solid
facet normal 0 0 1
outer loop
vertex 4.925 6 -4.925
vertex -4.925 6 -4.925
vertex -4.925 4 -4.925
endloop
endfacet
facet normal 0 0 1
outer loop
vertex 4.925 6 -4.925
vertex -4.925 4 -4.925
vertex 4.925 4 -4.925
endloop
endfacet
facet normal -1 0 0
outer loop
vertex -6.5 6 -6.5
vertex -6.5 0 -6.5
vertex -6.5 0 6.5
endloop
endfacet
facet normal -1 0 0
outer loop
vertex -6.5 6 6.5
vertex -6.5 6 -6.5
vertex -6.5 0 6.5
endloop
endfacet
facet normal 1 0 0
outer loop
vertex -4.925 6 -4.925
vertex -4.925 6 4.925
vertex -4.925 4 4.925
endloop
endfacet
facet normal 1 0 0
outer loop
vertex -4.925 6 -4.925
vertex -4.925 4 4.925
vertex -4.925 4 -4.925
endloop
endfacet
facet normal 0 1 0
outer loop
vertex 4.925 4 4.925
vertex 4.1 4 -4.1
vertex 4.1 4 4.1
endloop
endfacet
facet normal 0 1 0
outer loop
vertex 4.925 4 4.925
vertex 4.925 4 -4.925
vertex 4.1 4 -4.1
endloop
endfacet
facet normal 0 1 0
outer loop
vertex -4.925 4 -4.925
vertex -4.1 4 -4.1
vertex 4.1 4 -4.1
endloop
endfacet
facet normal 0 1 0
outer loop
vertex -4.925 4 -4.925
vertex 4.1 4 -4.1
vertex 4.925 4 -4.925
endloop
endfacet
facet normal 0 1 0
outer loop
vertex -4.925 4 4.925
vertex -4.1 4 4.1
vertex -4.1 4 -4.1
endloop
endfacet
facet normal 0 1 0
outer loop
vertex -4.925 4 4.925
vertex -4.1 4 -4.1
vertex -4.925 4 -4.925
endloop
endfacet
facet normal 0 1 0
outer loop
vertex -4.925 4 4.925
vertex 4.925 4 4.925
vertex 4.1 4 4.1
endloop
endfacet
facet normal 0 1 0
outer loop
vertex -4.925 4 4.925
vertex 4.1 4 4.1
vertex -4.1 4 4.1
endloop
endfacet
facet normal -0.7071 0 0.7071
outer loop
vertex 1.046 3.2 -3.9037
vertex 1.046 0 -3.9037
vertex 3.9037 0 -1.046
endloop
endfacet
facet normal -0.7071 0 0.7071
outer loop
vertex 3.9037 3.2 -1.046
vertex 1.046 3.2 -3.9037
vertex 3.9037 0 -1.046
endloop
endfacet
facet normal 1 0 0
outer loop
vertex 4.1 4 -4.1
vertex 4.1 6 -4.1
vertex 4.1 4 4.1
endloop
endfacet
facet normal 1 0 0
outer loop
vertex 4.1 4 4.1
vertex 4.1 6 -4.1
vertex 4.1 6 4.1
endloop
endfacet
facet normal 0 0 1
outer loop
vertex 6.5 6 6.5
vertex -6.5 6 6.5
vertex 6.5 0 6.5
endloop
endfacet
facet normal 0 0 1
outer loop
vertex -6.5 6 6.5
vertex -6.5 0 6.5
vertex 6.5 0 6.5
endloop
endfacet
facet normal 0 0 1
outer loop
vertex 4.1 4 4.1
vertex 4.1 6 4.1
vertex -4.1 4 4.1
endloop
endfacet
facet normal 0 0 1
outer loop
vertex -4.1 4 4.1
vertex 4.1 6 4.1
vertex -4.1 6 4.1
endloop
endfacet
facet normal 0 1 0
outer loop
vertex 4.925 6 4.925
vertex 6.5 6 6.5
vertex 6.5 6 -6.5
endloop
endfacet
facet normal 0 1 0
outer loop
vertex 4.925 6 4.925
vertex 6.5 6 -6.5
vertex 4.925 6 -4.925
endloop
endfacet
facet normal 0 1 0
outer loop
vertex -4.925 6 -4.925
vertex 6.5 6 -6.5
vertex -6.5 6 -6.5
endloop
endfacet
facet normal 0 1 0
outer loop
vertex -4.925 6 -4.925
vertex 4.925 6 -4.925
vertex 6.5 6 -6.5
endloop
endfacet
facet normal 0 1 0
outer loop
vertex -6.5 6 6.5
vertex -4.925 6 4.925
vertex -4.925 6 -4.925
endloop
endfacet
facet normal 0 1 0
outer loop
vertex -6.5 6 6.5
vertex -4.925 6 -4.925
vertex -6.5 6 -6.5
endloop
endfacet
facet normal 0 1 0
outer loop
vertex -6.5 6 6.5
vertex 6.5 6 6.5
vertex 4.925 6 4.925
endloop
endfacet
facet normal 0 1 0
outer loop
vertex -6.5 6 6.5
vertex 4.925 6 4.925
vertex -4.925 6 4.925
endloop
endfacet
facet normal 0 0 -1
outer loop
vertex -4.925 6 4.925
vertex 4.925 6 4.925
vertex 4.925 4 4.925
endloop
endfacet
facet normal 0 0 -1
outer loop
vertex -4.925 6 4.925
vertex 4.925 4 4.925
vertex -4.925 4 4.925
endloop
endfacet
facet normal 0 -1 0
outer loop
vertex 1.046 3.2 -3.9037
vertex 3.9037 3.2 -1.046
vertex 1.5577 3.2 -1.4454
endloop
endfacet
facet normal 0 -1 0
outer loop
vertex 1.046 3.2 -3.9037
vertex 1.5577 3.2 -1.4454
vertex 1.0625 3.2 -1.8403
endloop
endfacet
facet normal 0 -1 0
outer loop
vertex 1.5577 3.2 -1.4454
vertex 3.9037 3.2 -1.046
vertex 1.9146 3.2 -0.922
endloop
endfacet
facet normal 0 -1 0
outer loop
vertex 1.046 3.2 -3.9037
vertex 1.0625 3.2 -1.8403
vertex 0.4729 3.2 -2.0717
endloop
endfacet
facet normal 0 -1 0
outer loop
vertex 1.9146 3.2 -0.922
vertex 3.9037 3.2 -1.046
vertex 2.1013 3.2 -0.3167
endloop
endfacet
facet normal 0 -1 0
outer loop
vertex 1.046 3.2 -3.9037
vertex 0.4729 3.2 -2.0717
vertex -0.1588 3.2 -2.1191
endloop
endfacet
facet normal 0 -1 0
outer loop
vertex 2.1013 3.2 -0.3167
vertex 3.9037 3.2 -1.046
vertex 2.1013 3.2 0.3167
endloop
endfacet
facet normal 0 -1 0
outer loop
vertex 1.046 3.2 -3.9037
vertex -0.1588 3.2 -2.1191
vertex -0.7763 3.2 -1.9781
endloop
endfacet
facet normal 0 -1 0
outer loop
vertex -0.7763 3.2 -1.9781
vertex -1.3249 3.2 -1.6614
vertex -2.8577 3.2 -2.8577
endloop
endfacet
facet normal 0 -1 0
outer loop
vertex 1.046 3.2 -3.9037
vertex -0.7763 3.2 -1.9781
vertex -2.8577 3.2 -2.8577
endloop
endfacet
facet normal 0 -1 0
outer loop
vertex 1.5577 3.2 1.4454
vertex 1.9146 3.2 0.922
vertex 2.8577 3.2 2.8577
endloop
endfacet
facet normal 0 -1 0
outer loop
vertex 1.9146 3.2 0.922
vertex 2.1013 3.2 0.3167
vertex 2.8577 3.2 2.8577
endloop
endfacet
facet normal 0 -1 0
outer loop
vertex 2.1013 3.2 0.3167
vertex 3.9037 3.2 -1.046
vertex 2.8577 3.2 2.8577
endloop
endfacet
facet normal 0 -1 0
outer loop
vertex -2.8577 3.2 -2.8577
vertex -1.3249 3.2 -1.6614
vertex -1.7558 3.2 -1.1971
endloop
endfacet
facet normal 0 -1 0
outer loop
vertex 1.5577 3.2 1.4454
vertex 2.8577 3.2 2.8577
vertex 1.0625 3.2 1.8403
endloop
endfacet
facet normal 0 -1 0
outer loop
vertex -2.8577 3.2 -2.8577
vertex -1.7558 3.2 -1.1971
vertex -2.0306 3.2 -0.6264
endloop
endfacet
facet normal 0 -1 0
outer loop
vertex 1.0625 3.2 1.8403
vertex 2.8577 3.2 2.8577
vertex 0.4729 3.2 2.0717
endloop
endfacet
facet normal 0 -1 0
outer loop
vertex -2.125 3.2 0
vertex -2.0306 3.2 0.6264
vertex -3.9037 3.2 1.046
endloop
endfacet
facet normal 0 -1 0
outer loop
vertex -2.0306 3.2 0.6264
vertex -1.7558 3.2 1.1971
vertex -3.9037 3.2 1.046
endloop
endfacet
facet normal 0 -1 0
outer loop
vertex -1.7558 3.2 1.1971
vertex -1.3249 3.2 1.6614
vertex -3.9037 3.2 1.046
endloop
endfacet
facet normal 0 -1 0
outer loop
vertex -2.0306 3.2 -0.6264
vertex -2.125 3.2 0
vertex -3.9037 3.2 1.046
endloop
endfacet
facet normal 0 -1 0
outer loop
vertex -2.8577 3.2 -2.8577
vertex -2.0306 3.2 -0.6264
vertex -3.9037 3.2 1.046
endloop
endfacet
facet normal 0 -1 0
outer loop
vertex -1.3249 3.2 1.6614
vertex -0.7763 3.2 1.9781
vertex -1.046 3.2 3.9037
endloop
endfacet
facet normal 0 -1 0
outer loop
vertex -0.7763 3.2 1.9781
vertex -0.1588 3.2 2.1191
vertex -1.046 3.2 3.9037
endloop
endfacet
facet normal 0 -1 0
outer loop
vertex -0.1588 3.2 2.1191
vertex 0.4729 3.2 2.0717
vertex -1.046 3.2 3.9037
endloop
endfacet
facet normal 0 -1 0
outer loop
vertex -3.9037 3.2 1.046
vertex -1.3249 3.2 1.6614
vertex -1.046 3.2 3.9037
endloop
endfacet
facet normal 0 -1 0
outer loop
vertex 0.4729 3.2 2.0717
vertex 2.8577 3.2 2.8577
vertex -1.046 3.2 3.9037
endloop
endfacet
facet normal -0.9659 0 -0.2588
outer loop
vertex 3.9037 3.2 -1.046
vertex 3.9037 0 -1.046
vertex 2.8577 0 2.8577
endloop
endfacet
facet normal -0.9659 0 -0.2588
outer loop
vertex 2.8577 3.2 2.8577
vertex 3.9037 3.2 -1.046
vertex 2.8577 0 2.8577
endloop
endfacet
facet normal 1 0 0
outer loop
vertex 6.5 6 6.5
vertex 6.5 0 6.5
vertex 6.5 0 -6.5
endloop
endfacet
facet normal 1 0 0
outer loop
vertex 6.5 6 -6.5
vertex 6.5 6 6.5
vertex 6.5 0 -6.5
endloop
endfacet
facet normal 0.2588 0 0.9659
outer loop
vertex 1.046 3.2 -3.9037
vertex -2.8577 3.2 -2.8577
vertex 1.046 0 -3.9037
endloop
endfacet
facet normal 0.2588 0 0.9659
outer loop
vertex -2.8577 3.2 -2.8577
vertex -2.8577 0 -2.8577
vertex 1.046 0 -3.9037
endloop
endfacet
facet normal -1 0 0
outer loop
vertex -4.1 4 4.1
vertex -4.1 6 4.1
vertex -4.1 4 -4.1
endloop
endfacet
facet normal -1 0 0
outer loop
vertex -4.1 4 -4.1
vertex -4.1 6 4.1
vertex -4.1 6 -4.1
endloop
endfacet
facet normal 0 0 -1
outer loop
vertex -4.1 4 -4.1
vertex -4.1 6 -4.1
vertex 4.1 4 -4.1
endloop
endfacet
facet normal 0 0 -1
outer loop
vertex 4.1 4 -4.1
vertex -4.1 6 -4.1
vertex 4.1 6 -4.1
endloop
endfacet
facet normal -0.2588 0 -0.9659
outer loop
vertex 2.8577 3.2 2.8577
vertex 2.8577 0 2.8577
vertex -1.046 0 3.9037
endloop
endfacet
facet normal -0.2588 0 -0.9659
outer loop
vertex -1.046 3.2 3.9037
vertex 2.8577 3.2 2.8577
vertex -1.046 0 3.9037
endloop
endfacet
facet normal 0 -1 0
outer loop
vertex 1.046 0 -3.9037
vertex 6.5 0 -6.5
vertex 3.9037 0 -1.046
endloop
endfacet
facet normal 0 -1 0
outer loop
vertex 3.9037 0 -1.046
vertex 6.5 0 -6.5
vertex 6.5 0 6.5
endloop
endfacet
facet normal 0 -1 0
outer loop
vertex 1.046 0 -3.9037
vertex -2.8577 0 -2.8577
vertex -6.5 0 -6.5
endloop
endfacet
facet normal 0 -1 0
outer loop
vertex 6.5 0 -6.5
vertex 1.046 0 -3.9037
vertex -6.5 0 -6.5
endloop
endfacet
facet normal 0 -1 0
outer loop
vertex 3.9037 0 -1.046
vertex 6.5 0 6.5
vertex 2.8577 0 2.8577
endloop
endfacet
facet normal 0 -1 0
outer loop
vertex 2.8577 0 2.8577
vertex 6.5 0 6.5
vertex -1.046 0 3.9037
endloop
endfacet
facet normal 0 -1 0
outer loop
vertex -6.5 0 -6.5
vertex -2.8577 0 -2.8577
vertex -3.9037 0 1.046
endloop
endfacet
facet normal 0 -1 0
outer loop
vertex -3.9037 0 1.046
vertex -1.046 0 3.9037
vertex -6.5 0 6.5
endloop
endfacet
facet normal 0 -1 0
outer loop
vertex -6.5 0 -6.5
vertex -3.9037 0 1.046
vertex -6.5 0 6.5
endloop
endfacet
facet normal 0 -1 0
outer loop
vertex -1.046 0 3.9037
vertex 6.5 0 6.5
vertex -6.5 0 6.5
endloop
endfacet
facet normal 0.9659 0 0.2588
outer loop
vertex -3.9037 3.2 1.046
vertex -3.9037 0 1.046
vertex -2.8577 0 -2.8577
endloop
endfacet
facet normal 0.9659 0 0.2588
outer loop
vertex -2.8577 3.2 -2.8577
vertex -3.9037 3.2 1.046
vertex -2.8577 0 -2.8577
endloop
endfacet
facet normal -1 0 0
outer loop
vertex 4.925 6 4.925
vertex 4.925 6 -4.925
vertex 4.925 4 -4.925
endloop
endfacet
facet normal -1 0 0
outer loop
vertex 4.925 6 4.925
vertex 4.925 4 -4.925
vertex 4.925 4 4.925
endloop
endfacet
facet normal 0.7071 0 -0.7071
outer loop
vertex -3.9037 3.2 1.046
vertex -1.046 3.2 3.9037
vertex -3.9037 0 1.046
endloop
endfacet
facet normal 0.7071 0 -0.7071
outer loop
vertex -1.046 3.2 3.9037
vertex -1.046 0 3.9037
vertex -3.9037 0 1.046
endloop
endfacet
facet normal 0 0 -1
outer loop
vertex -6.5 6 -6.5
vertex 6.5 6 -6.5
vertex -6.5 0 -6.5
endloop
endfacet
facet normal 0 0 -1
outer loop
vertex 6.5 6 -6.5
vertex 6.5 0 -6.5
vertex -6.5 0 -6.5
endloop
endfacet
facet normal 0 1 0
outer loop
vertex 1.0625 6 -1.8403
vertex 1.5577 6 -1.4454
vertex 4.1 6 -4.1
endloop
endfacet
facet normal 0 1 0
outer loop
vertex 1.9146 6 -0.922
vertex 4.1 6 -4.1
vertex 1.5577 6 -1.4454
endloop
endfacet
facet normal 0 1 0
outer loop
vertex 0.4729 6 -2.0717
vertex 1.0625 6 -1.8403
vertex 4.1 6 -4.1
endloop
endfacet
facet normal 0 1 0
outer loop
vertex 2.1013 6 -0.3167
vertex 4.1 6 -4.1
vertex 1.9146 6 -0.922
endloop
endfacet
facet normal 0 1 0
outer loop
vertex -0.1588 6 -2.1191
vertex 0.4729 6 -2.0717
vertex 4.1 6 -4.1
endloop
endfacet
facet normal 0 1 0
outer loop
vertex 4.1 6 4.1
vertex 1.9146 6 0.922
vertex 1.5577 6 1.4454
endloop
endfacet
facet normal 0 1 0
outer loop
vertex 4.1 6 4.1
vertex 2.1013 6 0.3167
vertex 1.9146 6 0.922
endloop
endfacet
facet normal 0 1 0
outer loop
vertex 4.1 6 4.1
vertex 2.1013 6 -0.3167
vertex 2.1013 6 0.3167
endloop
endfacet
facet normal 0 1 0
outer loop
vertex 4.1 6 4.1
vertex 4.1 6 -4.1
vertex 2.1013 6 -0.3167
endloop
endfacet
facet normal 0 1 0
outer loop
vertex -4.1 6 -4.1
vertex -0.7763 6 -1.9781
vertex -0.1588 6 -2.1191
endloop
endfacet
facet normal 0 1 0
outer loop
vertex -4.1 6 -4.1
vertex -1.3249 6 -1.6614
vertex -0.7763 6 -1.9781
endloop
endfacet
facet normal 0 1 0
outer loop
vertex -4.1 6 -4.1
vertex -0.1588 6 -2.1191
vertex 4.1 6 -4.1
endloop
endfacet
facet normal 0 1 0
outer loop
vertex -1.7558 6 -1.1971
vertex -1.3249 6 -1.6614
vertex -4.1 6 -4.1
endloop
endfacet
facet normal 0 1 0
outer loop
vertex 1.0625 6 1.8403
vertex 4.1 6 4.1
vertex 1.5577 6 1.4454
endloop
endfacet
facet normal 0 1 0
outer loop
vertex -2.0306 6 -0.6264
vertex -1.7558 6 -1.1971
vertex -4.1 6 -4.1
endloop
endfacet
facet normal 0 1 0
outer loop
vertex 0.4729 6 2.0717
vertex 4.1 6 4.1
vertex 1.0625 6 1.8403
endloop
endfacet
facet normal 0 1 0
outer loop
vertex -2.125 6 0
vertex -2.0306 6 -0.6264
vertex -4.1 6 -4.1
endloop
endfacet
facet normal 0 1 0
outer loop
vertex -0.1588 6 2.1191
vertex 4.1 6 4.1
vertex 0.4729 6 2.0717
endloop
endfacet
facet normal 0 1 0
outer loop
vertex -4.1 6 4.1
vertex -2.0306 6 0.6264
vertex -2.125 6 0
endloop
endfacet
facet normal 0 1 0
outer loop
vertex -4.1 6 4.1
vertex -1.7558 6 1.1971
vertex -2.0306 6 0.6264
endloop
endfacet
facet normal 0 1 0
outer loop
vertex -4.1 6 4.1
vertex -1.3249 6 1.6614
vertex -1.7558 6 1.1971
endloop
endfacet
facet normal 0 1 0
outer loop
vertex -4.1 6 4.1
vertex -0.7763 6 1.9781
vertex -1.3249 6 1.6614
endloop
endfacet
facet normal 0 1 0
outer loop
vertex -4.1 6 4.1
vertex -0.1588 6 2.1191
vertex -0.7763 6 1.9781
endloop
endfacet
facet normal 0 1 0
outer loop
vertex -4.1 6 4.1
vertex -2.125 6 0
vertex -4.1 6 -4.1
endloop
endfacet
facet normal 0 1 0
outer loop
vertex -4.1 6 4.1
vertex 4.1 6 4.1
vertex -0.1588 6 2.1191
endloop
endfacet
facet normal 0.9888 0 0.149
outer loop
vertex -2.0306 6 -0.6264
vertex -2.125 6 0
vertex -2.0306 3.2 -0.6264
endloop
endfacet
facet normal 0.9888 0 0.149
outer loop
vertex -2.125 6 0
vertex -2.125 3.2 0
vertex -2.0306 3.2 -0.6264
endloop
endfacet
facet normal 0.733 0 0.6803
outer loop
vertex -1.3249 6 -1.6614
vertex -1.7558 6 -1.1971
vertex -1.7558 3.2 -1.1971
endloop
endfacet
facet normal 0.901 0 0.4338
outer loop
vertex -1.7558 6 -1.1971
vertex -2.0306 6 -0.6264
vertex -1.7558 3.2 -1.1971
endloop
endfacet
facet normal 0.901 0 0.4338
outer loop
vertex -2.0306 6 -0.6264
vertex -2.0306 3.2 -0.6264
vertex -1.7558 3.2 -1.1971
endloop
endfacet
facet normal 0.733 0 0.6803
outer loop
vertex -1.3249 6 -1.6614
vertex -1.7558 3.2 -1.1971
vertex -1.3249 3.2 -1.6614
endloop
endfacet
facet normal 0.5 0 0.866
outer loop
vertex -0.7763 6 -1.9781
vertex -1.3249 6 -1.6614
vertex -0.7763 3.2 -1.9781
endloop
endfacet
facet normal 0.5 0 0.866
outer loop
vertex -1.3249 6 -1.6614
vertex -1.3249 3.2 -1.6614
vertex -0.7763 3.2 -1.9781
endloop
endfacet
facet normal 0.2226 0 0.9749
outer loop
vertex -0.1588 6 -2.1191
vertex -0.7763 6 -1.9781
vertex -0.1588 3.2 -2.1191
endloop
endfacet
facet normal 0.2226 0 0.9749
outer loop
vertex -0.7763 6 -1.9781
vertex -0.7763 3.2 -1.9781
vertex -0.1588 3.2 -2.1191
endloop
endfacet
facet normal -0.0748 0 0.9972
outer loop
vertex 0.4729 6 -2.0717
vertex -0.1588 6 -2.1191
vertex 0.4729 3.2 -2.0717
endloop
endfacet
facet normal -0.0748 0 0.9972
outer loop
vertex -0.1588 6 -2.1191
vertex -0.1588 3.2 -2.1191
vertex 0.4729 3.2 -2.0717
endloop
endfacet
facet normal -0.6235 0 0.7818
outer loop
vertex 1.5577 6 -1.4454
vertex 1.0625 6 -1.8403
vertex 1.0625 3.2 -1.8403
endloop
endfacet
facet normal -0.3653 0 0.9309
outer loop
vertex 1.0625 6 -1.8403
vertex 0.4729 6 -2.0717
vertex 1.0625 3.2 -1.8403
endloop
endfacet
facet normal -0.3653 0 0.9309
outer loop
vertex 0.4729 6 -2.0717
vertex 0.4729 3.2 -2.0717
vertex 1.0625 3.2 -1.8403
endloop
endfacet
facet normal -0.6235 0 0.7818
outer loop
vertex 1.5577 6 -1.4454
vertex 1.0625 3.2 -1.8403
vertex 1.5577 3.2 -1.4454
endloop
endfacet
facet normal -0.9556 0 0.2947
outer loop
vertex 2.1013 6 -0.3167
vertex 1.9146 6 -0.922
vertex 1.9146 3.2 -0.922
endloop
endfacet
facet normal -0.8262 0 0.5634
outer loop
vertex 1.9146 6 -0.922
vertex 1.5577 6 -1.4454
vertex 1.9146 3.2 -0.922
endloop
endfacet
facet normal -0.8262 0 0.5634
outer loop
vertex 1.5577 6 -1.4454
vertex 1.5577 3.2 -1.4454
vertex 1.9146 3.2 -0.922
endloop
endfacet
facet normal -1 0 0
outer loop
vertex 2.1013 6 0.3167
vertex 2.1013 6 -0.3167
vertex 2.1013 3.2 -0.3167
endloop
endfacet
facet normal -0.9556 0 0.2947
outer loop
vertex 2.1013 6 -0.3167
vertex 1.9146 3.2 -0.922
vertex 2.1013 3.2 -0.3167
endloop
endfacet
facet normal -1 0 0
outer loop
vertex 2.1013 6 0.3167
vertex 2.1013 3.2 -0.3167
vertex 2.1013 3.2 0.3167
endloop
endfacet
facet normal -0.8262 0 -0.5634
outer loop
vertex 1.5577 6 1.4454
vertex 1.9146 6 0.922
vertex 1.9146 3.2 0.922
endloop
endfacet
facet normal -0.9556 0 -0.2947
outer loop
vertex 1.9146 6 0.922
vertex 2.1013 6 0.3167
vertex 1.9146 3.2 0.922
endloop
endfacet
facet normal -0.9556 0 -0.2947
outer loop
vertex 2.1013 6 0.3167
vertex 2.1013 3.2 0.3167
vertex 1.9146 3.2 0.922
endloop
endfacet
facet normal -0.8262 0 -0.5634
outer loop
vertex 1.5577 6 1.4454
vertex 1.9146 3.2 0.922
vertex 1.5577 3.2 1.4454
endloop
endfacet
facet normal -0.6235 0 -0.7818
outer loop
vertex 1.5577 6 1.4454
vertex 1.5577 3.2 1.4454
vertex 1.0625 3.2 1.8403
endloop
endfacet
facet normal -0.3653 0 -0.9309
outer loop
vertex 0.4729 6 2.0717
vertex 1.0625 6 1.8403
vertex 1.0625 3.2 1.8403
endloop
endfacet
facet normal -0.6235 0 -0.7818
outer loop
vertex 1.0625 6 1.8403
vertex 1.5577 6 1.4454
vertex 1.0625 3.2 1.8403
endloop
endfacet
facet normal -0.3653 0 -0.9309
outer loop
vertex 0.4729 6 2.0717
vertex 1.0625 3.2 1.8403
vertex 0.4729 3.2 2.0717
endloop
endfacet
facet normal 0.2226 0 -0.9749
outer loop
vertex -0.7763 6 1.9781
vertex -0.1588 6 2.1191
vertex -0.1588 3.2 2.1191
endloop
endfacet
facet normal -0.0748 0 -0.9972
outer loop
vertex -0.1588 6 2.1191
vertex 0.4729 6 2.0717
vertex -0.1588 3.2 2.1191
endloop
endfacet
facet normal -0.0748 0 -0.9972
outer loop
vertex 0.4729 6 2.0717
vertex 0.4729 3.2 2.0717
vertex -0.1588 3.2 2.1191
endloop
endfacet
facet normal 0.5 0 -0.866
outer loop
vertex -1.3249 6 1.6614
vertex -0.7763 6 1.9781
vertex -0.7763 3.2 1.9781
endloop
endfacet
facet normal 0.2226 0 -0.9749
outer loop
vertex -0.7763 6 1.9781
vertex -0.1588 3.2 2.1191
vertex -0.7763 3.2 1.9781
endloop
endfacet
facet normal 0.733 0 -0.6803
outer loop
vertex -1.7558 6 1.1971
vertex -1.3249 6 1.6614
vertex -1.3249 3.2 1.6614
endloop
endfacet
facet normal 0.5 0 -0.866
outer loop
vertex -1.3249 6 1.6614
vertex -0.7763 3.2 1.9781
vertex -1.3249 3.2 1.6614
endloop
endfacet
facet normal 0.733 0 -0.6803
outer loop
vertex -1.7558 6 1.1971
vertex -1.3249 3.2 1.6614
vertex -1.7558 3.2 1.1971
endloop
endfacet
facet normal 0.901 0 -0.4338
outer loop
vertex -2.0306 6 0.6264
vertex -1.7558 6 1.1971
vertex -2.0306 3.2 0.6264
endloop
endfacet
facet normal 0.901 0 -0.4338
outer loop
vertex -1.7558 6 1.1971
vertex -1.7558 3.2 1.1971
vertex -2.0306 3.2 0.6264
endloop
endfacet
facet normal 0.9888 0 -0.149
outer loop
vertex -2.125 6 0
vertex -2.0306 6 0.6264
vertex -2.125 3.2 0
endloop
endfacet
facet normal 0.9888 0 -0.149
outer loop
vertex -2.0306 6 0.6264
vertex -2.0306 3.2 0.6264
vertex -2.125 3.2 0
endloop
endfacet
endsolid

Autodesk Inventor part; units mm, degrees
ref_plane "YZ Plane" through (0, 0, 0) normal (1, 0, 0) x (0, 1, 0)
ref_plane "XY Plane" through (0, 0, 0) normal (0, 0, 1) x (1, 0, 0)
ref_plane "作業平面2" through (0, 6, 0) normal (0, 1, 0) x (-1, 0, 0)
sketch "スケッチ3" plane through (0, 6, 0) normal (0, 1, 0) x (-1, 0, 0)
  line L0 (4.1, -4.1) -> (-4.1, -4.1)
  line L1 (-4.1, -4.1) -> (-4.1, 4.1)
  line L2 (-4.1, 4.1) -> (4.1, 4.1)
  line L3 (4.1, 4.1) -> (4.1, -4.1)
  line L4 (4.1, -4.1) -> (-4.1, 4.1) construction
  line L5 (-4.1, -4.1) -> (4.1, 4.1) construction
  line L6 (4.925, -4.925) -> (-4.925, -4.925)
  line L7 (-4.925, -4.925) -> (-4.925, 4.925)
  line L8 (-4.925, 4.925) -> (4.925, 4.925)
  line L9 (4.925, 4.925) -> (4.925, -4.925)
  line L10 (4.925, -4.925) -> (-4.925, 4.925) construction
  line L11 (-4.925, -4.925) -> (4.925, 4.925) construction
  point P0 (0, 0)
  point P1 (0, 0)
  dimension "d19" = 8.2
  dimension "d20" = 8.2
  dimension "d21" = 9.85
  dimension "d22" = 9.85
sketch "スケッチ1" plane through (0, 0, 0) normal (0, 1, 0) x (-1, 0, 0)
  line L0 (6.5, -6.5) -> (-6.5, 6.5) construction
  line L1 (-6.5, -6.5) -> (6.5, 6.5) construction
  line L2 (1.046, 3.9037) -> (3.9037, 1.046)
  line L3 (3.9037, 1.046) -> (2.8577, -2.8577)
  line L4 (2.8577, -2.8577) -> (-1.046, -3.9037)
  line L5 (-1.046, -3.9037) -> (-3.9037, -1.046)
  line L6 (-3.9037, -1.046) -> (-2.8577, 2.8577)
  line L7 (-2.8577, 2.8577) -> (1.046, 3.9037)
  line L8 (-6.5, -6.5) -> (6.5, -6.5)
  line L9 (6.5, -6.5) -> (6.5, 6.5)
  line L10 (6.5, 6.5) -> (-6.5, 6.5)
  line L11 (-6.5, 6.5) -> (-6.5, -6.5)
  line L12 (-6.5, -6.5) -> (6.5, 6.5) construction
  line L13 (6.5, -6.5) -> (-6.5, 6.5) construction
  circle A0 centre (0, 0) radius 2.125
  dimension "d33" = 7
  dimension "d34" = 13
  dimension "d35" = 13
  dimension "d36" = 4.25
extrude "押し出し8" add sketch "スケッチ1" along normal blind 6 contours L2 L3 L4 L5 L6 L7 | L11 L10 L9 L8 | A0
extrude "押し出し9" cut sketch "スケッチ3" against normal blind 2
extrude "押し出し10" cut sketch "スケッチ1" along normal blind 3.2 contours L2 L3 L4 L5 L6 L7
extrude "押し出し11" cut sketch "スケッチ1" along normal blind 6 contours A0
properties part number "pin_joint_plastic_ver2"
